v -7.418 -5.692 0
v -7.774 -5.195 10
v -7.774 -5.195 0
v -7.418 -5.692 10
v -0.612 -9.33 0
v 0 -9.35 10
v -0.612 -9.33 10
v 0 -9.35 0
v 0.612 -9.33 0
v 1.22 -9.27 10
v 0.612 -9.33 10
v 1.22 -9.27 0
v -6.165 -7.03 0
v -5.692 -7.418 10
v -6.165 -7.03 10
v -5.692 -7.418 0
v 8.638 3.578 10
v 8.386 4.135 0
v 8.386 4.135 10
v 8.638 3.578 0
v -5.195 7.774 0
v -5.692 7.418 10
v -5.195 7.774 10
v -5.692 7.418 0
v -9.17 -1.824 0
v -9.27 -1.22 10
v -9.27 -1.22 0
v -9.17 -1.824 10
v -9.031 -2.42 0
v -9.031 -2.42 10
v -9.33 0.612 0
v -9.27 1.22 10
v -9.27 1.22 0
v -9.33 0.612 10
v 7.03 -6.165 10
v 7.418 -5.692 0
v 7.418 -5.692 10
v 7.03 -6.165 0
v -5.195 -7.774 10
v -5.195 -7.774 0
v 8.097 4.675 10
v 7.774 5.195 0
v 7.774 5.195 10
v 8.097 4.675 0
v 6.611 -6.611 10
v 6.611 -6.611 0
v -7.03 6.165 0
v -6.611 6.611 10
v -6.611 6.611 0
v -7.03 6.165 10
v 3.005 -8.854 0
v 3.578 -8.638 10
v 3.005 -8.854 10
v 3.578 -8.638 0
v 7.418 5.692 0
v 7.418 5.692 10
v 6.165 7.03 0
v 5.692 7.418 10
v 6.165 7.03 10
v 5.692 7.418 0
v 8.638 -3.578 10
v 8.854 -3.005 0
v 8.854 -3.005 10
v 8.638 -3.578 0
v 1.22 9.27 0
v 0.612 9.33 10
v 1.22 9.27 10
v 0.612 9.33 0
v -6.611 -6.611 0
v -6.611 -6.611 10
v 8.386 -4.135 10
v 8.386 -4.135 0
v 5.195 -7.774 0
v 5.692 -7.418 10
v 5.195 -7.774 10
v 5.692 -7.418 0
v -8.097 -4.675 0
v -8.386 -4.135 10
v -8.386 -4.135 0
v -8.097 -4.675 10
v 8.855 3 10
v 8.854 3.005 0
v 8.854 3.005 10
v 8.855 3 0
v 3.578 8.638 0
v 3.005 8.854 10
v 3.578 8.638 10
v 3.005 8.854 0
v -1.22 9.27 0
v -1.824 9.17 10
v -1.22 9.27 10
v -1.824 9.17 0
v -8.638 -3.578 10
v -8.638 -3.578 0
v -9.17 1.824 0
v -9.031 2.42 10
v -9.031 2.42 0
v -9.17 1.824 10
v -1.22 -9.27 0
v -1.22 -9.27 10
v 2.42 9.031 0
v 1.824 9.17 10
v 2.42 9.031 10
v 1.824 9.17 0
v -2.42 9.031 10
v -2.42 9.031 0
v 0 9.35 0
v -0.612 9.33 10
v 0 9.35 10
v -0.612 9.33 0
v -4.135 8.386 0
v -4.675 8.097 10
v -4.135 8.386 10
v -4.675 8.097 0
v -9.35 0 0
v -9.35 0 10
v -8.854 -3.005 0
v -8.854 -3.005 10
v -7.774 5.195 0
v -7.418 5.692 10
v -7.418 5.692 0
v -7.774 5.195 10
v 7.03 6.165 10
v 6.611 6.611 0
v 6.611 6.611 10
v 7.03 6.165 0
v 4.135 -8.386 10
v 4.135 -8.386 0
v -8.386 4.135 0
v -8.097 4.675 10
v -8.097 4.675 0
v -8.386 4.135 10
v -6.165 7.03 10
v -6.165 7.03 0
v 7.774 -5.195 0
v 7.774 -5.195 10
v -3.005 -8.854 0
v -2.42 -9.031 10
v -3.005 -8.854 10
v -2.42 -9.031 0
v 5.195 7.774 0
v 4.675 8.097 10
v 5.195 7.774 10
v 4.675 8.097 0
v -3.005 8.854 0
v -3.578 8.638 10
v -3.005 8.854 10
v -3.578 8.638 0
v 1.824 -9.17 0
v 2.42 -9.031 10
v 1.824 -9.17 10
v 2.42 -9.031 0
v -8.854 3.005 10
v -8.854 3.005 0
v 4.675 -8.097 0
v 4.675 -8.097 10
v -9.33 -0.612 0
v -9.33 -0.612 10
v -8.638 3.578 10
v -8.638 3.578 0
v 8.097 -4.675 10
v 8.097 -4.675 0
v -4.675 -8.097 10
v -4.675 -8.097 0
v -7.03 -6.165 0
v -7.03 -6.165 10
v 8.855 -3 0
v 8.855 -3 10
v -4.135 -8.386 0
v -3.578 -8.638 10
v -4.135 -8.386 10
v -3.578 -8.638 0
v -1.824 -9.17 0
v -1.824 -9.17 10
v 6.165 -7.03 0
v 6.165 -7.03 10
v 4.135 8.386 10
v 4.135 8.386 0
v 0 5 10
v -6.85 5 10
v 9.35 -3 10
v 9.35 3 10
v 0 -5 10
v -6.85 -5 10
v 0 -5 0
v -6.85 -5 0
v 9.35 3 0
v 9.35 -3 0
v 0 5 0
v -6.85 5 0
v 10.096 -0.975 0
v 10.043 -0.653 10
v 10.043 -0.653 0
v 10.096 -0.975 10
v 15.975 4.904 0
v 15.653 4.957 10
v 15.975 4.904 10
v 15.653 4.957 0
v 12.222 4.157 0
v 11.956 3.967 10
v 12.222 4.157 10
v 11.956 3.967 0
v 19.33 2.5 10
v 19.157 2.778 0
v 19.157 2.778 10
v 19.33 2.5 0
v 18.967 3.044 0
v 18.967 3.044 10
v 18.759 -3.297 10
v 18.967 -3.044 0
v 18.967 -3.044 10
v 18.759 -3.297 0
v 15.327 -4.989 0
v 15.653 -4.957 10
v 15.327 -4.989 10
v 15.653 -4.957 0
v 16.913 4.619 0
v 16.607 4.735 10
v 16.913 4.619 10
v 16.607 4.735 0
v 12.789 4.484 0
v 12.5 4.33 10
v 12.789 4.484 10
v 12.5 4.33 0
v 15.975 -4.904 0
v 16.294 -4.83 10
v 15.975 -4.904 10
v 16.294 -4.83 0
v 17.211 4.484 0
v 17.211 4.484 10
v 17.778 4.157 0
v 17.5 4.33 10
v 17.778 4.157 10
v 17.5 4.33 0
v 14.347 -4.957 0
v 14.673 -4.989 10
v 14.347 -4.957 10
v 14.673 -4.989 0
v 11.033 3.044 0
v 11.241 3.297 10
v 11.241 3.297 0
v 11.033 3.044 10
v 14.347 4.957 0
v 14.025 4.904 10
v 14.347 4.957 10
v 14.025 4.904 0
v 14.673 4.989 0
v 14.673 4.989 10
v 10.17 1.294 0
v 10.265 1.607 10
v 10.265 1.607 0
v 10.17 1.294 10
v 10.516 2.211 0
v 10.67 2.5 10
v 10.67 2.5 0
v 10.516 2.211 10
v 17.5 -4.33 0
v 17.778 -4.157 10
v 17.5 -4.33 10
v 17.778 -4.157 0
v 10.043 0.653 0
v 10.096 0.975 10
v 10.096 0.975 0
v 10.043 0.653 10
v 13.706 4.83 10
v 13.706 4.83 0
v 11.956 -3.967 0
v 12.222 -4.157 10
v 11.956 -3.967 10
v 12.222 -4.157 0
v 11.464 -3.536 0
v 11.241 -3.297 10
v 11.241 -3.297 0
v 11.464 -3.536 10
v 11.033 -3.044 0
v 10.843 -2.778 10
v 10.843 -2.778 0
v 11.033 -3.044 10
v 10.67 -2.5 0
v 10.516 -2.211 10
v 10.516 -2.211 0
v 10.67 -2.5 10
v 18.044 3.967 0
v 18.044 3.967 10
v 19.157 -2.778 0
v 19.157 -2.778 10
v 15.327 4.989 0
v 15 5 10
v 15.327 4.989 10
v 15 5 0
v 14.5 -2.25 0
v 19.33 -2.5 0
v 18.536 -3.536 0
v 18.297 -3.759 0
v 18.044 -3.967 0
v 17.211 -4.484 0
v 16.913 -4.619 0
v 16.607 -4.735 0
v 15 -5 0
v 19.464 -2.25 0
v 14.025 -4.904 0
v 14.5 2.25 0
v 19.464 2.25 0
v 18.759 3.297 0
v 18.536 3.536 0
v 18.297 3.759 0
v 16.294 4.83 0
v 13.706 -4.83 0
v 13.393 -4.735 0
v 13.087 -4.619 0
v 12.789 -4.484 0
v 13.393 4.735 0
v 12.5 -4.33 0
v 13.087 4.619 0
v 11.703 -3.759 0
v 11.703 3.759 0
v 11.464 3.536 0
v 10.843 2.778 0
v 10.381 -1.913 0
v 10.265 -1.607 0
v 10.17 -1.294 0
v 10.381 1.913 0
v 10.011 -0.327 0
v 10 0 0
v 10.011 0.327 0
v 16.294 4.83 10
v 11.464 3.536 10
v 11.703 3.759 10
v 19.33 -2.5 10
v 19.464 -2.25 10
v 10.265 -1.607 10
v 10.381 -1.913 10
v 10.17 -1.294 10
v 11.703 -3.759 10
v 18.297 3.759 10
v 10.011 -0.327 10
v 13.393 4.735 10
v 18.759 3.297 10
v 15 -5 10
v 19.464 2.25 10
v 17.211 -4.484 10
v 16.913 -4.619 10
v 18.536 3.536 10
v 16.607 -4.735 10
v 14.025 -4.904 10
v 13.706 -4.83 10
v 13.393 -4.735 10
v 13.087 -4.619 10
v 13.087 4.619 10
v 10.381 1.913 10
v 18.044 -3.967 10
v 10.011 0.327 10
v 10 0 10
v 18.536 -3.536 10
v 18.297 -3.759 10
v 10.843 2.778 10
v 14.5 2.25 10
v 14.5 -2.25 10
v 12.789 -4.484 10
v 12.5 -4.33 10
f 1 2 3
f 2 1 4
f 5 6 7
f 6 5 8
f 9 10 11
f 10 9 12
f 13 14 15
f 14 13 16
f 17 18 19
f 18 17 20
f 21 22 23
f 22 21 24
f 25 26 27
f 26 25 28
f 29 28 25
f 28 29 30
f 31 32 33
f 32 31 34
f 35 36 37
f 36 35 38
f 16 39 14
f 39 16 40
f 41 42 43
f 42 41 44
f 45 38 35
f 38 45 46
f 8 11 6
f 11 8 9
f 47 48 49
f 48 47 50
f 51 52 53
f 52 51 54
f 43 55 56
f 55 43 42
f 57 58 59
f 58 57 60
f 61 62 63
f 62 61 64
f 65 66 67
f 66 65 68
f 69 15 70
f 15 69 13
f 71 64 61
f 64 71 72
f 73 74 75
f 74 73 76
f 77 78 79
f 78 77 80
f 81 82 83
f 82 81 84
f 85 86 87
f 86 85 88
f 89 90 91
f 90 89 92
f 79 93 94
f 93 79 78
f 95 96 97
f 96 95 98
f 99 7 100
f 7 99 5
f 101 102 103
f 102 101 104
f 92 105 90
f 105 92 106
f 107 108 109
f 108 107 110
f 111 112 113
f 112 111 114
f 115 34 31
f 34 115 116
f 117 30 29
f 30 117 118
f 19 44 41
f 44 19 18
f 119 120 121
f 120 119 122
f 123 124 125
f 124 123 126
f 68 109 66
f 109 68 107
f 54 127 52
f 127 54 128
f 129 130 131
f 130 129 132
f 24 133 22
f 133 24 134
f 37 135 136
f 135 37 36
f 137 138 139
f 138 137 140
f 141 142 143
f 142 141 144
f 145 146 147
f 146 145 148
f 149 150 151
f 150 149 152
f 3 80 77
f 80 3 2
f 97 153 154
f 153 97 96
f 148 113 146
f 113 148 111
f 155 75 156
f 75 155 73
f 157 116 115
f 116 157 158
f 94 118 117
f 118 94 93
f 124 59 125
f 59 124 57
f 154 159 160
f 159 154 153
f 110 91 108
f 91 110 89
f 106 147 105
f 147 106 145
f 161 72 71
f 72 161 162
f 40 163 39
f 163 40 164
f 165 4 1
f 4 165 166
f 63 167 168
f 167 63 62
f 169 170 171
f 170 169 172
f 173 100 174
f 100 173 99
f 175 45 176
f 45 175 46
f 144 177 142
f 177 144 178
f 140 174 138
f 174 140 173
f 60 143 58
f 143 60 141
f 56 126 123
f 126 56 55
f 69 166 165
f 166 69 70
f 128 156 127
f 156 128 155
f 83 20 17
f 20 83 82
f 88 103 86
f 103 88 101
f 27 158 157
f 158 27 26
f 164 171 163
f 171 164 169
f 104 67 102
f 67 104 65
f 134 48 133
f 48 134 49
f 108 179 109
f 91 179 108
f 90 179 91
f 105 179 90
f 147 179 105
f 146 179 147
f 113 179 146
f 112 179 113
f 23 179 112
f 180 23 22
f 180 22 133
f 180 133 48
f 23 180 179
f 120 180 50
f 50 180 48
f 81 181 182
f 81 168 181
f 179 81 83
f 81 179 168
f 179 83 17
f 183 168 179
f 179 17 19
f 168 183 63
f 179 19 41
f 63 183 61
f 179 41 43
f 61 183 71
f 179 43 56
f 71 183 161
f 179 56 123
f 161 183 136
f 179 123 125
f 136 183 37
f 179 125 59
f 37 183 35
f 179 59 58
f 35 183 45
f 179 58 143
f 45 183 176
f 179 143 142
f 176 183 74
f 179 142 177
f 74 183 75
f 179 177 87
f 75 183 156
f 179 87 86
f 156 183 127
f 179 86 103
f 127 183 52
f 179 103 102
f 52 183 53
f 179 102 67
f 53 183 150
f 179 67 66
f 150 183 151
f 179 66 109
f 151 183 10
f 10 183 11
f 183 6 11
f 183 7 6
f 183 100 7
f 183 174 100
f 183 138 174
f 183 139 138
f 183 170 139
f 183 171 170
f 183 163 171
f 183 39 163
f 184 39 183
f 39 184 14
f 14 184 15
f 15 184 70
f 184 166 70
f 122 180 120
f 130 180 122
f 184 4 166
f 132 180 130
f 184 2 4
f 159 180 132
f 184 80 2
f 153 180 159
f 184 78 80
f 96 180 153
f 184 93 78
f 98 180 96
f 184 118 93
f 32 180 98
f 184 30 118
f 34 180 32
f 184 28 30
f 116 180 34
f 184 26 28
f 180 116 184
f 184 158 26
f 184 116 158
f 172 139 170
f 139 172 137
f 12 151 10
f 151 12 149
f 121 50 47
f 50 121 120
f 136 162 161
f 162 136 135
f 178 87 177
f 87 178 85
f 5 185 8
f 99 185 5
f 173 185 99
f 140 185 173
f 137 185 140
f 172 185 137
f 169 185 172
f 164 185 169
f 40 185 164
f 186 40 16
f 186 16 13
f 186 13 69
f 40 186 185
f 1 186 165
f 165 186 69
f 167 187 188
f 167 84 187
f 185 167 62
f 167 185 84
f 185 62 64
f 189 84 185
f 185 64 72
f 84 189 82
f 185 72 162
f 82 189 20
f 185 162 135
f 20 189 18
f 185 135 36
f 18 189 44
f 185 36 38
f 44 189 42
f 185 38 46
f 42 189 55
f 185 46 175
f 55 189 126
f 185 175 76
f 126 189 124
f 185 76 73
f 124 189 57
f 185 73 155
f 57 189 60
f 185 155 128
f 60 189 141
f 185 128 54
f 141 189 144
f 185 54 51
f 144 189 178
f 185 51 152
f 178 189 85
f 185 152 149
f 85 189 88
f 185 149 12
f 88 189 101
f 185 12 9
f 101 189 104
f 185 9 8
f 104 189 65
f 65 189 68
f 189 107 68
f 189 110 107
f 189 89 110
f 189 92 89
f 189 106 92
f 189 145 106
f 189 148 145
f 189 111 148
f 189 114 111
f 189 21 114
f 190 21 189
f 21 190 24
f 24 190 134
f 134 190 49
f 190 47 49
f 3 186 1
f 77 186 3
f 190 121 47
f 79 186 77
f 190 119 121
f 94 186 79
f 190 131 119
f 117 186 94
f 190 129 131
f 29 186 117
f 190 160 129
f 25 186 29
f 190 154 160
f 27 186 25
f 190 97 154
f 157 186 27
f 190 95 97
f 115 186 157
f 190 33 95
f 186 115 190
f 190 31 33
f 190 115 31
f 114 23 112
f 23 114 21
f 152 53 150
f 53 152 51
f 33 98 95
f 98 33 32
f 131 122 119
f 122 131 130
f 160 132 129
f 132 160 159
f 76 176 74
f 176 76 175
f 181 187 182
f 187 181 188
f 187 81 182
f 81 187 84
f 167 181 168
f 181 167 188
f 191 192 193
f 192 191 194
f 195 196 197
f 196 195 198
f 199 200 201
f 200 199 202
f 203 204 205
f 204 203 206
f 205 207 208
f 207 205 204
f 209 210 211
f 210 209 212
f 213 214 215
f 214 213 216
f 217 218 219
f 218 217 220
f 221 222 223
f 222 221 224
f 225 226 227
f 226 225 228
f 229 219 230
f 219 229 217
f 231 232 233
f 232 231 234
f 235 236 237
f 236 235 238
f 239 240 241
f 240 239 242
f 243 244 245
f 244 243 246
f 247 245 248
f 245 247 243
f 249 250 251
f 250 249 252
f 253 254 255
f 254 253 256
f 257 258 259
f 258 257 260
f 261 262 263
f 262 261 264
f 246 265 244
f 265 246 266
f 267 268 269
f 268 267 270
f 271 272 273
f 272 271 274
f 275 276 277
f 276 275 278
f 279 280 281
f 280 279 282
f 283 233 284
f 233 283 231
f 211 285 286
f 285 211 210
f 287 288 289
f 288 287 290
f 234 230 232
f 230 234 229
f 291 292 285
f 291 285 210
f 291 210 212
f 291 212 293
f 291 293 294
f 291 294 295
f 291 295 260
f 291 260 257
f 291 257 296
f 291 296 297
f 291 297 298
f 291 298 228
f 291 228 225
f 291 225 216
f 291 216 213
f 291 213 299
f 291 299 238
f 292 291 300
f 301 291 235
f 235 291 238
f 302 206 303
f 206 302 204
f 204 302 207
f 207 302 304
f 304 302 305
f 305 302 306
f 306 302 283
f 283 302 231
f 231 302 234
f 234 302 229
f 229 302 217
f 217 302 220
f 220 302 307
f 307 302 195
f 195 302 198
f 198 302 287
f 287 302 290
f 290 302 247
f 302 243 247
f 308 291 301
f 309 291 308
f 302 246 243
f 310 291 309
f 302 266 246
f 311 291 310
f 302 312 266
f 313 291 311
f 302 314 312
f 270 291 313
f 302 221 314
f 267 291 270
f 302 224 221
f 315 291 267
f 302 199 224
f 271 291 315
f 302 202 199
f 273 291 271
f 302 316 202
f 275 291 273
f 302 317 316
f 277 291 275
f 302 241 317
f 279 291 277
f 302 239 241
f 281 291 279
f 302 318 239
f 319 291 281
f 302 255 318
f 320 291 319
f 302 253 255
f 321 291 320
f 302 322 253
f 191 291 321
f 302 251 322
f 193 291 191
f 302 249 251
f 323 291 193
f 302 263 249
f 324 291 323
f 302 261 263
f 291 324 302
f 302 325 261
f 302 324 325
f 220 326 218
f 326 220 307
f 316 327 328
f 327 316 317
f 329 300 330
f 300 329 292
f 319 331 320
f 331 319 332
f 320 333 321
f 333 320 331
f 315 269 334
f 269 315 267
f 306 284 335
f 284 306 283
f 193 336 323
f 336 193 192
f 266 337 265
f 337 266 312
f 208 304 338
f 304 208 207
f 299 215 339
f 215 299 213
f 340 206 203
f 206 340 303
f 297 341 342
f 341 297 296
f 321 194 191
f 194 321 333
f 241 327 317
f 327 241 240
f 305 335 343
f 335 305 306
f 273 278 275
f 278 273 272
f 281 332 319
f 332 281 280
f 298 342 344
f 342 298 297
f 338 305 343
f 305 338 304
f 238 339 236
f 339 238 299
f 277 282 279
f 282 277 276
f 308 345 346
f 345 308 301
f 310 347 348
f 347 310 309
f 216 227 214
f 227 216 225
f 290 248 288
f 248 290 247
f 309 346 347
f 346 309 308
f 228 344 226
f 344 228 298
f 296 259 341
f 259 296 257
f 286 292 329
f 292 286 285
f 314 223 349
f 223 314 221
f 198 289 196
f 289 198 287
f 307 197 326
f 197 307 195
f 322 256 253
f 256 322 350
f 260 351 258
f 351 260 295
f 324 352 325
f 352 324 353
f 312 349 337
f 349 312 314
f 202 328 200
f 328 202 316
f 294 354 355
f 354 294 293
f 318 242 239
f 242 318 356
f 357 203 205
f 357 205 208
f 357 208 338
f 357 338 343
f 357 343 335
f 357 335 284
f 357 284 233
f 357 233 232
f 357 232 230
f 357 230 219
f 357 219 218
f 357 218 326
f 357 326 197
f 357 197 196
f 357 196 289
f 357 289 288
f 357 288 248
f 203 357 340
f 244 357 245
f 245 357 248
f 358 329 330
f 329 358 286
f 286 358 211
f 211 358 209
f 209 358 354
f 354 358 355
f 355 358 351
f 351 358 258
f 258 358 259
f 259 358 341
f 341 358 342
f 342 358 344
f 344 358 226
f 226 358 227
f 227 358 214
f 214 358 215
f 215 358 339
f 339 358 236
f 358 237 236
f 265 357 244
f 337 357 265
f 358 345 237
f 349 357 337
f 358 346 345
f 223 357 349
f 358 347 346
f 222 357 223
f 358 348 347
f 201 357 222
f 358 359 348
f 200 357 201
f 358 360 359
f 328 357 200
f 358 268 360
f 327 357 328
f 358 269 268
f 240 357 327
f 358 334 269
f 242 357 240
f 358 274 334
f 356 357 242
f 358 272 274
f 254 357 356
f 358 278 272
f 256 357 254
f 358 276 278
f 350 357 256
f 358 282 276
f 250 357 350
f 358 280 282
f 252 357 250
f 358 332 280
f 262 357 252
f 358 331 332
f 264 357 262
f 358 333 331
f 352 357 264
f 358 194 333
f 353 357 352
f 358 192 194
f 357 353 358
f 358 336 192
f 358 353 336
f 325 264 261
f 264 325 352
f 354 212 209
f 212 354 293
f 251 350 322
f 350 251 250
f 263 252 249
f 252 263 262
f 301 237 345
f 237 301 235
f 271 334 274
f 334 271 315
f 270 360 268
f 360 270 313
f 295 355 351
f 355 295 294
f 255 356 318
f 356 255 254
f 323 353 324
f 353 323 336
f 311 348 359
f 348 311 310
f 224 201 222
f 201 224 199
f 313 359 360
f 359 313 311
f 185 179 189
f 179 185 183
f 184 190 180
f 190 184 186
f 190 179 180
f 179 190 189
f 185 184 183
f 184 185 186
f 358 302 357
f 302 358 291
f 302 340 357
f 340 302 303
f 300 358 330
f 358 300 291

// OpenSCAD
// Snap-on clip: rod ring with a opening, a tubing ring with a opening, and a bridge
// Print orientation: flat on bed (2-D profile in XY), extruded in +Z

// ---------- Parameters ----------
stand_d      = 12.7;   // stand rod diameter
stand_wall   = 3;      // stand rod ring wall thickness
bridge_w     = 6;      // bridge width (Y) between rings
tub_d        = 6;      // tubing hole diameter
tub_wall     = 2;      // tubing ring wall thickness
tub_x        = 15;     // tubing hole centre X
eps          = 0.5;    // cutter overshoot past faces
h            = 10;     // extrusion height (Z)

$fn = 96;

// ---------- Derived ----------
stand_od = stand_d + 2 * stand_wall;   // 18.7 mm
tub_od   = tub_d + 2 * tub_wall;       // 10 mm

// ---------- Model ----------
difference() {
    union() {
        // Stand rod ring
        cylinder(d = stand_od, h = h);
        // Bridge (overlaps ring solid, does not block the hole)
        translate([stand_d / 2 - bridge_w / 2, -bridge_w / 2, 0])
            cube([bridge_w, bridge_w, h]);
        // Tubing hole ring
        translate([tub_x, 0, 0])
            cylinder(d = tub_od, h = h);
    }
    // Stand rod opening (x < 0, -5 < y < 5)
    translate([-stand_d / 2 - eps, -5, 0])
        cube([stand_d / 2 + eps, 10, h + 2 * eps]);
    // Tubing hole opening (x > 15, -2.25 < y < 2.25)
    translate([tub_x - eps, -2.25, 0])
        cube([tub_od / 2 + eps, 4.5, h + 2 * eps]);
}
